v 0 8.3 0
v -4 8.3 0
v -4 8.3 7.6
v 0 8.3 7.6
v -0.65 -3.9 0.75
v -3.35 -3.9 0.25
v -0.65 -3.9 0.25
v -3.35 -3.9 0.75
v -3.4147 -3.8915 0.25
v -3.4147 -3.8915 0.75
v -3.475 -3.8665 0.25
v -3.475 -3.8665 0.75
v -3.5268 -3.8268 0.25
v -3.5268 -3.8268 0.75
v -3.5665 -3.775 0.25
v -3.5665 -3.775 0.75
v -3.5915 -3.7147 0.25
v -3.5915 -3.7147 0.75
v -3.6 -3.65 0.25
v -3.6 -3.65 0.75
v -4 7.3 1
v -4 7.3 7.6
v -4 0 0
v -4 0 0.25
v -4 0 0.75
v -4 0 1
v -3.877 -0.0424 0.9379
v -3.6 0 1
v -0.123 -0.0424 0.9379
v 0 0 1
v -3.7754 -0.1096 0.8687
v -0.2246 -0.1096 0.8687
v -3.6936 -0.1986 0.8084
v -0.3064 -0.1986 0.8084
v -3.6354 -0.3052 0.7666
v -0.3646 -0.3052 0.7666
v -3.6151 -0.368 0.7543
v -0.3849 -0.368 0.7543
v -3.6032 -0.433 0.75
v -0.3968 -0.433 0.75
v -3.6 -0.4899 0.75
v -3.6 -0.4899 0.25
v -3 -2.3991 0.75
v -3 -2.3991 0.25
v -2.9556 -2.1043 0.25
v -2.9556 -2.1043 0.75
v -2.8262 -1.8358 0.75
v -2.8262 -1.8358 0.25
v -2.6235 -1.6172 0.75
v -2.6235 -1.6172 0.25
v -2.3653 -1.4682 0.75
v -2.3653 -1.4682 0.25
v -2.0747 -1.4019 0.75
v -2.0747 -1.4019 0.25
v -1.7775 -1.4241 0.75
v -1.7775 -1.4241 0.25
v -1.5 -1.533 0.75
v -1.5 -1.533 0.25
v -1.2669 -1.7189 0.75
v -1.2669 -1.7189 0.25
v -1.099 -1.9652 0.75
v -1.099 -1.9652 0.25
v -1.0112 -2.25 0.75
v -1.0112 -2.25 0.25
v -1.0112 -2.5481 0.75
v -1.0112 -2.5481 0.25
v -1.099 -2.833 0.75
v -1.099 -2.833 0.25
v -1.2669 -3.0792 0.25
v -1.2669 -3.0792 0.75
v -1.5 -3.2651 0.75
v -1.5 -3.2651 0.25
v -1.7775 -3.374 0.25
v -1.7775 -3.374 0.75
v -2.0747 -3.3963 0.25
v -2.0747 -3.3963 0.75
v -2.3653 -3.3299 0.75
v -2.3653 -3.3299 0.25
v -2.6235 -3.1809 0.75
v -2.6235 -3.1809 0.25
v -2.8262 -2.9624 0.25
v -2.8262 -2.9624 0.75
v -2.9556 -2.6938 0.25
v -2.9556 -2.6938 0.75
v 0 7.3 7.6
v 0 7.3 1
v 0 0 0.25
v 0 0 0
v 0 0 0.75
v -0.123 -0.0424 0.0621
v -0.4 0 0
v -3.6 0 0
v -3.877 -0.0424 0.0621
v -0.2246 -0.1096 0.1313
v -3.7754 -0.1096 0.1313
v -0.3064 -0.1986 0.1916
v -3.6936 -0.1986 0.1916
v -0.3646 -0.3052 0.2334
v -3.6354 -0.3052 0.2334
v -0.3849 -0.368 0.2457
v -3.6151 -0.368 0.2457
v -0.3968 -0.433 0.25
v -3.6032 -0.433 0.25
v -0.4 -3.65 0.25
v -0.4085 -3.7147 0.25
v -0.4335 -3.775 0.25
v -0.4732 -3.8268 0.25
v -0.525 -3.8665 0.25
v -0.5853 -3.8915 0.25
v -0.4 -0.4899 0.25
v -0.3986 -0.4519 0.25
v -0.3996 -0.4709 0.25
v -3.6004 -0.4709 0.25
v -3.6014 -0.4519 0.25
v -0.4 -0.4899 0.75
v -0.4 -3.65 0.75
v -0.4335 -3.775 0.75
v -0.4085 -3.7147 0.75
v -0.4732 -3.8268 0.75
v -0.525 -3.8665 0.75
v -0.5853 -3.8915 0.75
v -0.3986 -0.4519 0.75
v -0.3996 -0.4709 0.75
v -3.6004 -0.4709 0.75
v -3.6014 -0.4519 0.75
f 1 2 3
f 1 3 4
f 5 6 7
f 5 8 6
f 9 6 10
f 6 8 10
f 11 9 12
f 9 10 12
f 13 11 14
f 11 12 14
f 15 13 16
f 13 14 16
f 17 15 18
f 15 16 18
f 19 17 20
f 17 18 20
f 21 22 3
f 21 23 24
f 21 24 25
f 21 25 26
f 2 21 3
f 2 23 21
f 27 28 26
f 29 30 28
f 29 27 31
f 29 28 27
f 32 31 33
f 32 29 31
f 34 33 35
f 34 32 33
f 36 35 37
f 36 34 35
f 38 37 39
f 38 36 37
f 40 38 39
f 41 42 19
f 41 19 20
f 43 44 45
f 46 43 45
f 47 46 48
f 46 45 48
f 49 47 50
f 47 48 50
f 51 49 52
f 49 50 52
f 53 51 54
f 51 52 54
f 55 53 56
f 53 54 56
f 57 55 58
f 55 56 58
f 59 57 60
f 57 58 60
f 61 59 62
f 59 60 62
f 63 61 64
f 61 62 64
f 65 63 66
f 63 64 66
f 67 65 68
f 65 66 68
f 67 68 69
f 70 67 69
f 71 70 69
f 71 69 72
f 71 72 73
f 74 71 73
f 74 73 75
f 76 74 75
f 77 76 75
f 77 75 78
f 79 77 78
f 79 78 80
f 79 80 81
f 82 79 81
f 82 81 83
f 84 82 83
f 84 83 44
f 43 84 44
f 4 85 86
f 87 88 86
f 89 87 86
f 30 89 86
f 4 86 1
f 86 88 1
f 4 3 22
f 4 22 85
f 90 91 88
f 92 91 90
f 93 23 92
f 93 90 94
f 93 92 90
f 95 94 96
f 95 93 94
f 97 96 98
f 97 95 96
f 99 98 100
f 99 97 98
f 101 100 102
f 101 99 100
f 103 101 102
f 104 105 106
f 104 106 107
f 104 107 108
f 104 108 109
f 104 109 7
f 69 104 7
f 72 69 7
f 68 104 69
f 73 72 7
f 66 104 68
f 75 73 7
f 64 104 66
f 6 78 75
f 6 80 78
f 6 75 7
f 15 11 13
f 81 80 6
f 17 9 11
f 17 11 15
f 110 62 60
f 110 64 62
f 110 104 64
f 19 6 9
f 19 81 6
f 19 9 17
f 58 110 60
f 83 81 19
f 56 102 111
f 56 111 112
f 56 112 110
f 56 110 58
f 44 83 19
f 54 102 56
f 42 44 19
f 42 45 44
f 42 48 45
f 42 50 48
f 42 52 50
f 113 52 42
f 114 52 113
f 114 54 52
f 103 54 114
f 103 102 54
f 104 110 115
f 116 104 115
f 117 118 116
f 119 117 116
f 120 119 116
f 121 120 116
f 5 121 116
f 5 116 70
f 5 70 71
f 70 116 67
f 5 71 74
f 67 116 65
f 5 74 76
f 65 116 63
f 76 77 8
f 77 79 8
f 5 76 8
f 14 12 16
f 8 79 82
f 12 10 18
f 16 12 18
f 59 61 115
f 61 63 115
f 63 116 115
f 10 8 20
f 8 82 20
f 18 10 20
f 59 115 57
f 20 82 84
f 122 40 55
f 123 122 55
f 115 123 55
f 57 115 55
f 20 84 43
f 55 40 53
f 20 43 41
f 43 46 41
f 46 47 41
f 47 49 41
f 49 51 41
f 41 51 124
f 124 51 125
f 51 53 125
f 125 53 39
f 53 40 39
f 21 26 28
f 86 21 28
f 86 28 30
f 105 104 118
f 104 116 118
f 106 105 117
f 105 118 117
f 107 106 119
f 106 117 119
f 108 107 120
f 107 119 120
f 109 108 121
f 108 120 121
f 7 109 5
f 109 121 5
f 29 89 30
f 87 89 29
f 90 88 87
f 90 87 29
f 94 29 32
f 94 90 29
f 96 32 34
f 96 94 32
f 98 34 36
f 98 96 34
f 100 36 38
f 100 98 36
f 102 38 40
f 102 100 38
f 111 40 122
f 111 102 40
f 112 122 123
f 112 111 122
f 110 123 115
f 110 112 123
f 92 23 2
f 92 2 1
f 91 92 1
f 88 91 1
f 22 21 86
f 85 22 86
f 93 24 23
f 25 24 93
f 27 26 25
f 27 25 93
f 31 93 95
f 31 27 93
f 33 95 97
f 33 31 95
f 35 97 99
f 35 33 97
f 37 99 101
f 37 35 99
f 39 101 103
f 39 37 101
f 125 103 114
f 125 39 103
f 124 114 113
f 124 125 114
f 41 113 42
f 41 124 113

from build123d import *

# Parameters (mm, degrees)
SZKIC1_W                    = 4
SZKIC1_H                    = 1
DODANIE_WYCI_GNI_CIE1_DEPTH = 8.3
SZKIC2_W                    = 4
SZKIC2_H                    = 1
DODANIE_WYCI_GNI_CIE2_DEPTH = 6.6
SZKIC3_W                    = 3.2
SZKIC3_H                    = 0.5
DODANIE_WYCI_GNI_CIE3_DEPTH = 3.9
ZAOKR_GLENIE1_R             = 0.5
ZAOKR_GLENIE2_R             = 0.25
SZKIC4_R                    = 1
WYTNIJ_WYCI_GNI_CIE1_DEPTH  = 3.9


with BuildPart() as part:
    # Szkic1 → Dodanie-wyciągnięcie1 (new body)
    with BuildSketch(Plane(origin=(0, 0, 0), x_dir=(1, 0, 0), z_dir=(0, 1, 0))):
        with Locations((-2, -0.5)):
            Rectangle(SZKIC1_W, SZKIC1_H)
    extrude(amount=DODANIE_WYCI_GNI_CIE1_DEPTH)

    # Szkic2 → Dodanie-wyciągnięcie2 (add)
    with BuildSketch(Plane.XY.offset(1)):
        with Locations((-2, 7.8)):
            Rectangle(SZKIC2_W, SZKIC2_H)
    extrude(amount=DODANIE_WYCI_GNI_CIE2_DEPTH)

    # Szkic3 → Dodanie-wyciągnięcie3 (add)
    with BuildSketch(Plane.XZ):
        with Locations((-2, 0.5)):
            Rectangle(SZKIC3_W, SZKIC3_H)
    extrude(amount=DODANIE_WYCI_GNI_CIE3_DEPTH)

    # Zaokrąglenie1
    # the kernel refuses this fillet: 0.5 mm, written as the material it adds along each edge
    with BuildSketch(Plane(origin=(-0.4, 0, 0.25), x_dir=(1.0, -1.5702716904537035e-12, 0), z_dir=(0, 0, 1)), Plane(origin=(-3.6, 0, 0.75), x_dir=(-1.0, -1.5702716904537041e-12, 0), z_dir=(0, 0, -1))) as zaokr_glenie1_piece_1:
        with BuildLine():
            CenterArc((0.5, -0.489897949), ZAOKR_GLENIE1_R, 101.536959033, 78.463040967)
            Line((0, -0.489897949), (-0.01, -0.489897949))
            Line((-0.01, -0.489897949), (-0.01, 0))
            Line((-0.01, 0), (0, 0.01))
            ThreePointArc((0, 0.01), (0.2, 0.01), (0.398, 0.009797959))
            Line((0.398, 0.009797959), (0.4, 0))
        make_face()
    extrude(amount=0.5)
    with BuildSketch(Plane(origin=(-0.4, 0, 0.75), x_dir=(0, 0, 1), z_dir=(-1, 0, 0)), Plane(origin=(-3.6, 0, 0.25), x_dir=(0, 0, -1), z_dir=(1, 0, 0))) as zaokr_glenie1_piece_2:
        with BuildLine():
            CenterArc((0.5, -0.433012702), ZAOKR_GLENIE1_R, 120, 60)
            Line((0, -0.433012702), (-0.01, -0.433012702))
            Line((-0.01, -0.433012702), (-0.01, 0))
            Line((-0.01, 0), (0, 0.01))
            ThreePointArc((0, 0.01), (0.125, 0.01), (0.245, 0.008660254))
            Line((0.245, 0.008660254), (0.25, 0))
        make_face()
    extrude(amount=3.2)
    with BuildSketch(Plane(origin=(-0.4, 0, -0.974744871), x_dir=(1.0, -1.5702716904537035e-12, 0), z_dir=(0, 0, 1))) as zaokr_glenie1_piece_3a_section:
        with BuildLine():
            CenterArc((0.5, -0.489897949), ZAOKR_GLENIE1_R, 101.536959033, 78.463040967)
            Line((0, -0.489897949), (-0.01, -0.489897949))
            Line((-0.01, -0.489897949), (-0.01, 0))
            Line((-0.01, 0), (0, 0.01))
            ThreePointArc((0, 0.01), (0.2, 0.01), (0.398, 0.009797959))
            Line((0.398, 0.009797959), (0.4, 0))
        make_face()
    zaokr_glenie1_piece_3a = extrude(amount=1.724744871, mode=Mode.PRIVATE)
    zaokr_glenie1_piece_3a = split(zaokr_glenie1_piece_3a, bisect_by=Plane(origin=(-0.300219951, -0.114308546, 0), z_dir=(0, 0, 1)), keep=Keep.TOP, mode=Mode.PRIVATE)
    zaokr_glenie1_piece_3a = split(zaokr_glenie1_piece_3a, bisect_by=Plane(origin=(-0.300219951, -0.114308546, 0.25), z_dir=(0, 0, -1)), keep=Keep.TOP, mode=Mode.PRIVATE)
    with BuildSketch(Plane(origin=(-3.6, 0, 0.25), x_dir=(0, 0, -1), z_dir=(1, 0, 0))) as zaokr_glenie1_piece_3b_section:
        with BuildLine():
            CenterArc((0.5, -0.433012702), ZAOKR_GLENIE1_R, 120, 60)
            Line((0, -0.433012702), (-0.01, -0.433012702))
            Line((-0.01, -0.433012702), (-0.01, 0))
            Line((-0.01, 0), (0, 0.01))
            ThreePointArc((0, 0.01), (0.125, 0.01), (0.245, 0.008660254))
            Line((0.245, 0.008660254), (0.25, 0))
        make_face()
    zaokr_glenie1_piece_3b = extrude(amount=4.282531755, mode=Mode.PRIVATE)
    zaokr_glenie1_piece_3b = split(zaokr_glenie1_piece_3b, bisect_by=Plane(origin=(0, -0.108155223, 0.185241644), z_dir=(-1, 0, 0)), keep=Keep.TOP, mode=Mode.PRIVATE)
    zaokr_glenie1_piece_3b = split(zaokr_glenie1_piece_3b, bisect_by=Plane(origin=(-0.4, -0.108155223, 0.185241644), z_dir=(1, 0, 0)), keep=Keep.TOP, mode=Mode.PRIVATE)
    zaokr_glenie1_piece_3 = zaokr_glenie1_piece_3a & zaokr_glenie1_piece_3b
    add(zaokr_glenie1_piece_3)
    with BuildSketch(Plane(origin=(0.682531755, 0, 0.75), x_dir=(0, 0, 1), z_dir=(-1, 0, 0))) as zaokr_glenie1_piece_4a_section:
        with BuildLine():
            CenterArc((0.5, -0.433012702), ZAOKR_GLENIE1_R, 120, 60)
            Line((0, -0.433012702), (-0.01, -0.433012702))
            Line((-0.01, -0.433012702), (-0.01, 0))
            Line((-0.01, 0), (0, 0.01))
            ThreePointArc((0, 0.01), (0.125, 0.01), (0.245, 0.008660254))
            Line((0.245, 0.008660254), (0.25, 0))
        make_face()
    zaokr_glenie1_piece_4a = extrude(amount=4.282531755, mode=Mode.PRIVATE)
    zaokr_glenie1_piece_4a = split(zaokr_glenie1_piece_4a, bisect_by=Plane(origin=(0, -0.108155223, 0.814758356), z_dir=(-1, 0, 0)), keep=Keep.TOP, mode=Mode.PRIVATE)
    zaokr_glenie1_piece_4a = split(zaokr_glenie1_piece_4a, bisect_by=Plane(origin=(-0.4, -0.108155223, 0.814758356), z_dir=(1, 0, 0)), keep=Keep.TOP, mode=Mode.PRIVATE)
    with BuildSketch(Plane(origin=(-0.4, 0, 0.25), x_dir=(1.0, -1.5702716904537035e-12, 0), z_dir=(0, 0, 1))) as zaokr_glenie1_piece_4b_section:
        with BuildLine():
            CenterArc((0.5, -0.489897949), ZAOKR_GLENIE1_R, 101.536959033, 78.463040967)
            Line((0, -0.489897949), (-0.01, -0.489897949))
            Line((-0.01, -0.489897949), (-0.01, 0))
            Line((-0.01, 0), (0, 0.01))
            ThreePointArc((0, 0.01), (0.2, 0.01), (0.398, 0.009797959))
            Line((0.398, 0.009797959), (0.4, 0))
        make_face()
    zaokr_glenie1_piece_4b = extrude(amount=1.724744871, mode=Mode.PRIVATE)
    zaokr_glenie1_piece_4b = split(zaokr_glenie1_piece_4b, bisect_by=Plane(origin=(-0.300219951, -0.114308546, 1), z_dir=(0, 0, -1)), keep=Keep.TOP, mode=Mode.PRIVATE)
    zaokr_glenie1_piece_4b = split(zaokr_glenie1_piece_4b, bisect_by=Plane(origin=(-0.300219951, -0.114308546, 0.75), z_dir=(0, 0, 1)), keep=Keep.TOP, mode=Mode.PRIVATE)
    zaokr_glenie1_piece_4 = zaokr_glenie1_piece_4a & zaokr_glenie1_piece_4b
    add(zaokr_glenie1_piece_4)
    with BuildSketch(Plane(origin=(-3.6, 0, 1.974744871), x_dir=(-1.0, -1.5702716904537041e-12, 0), z_dir=(0, 0, -1))) as zaokr_glenie1_piece_5a_section:
        with BuildLine():
            CenterArc((0.5, -0.489897949), ZAOKR_GLENIE1_R, 101.536959033, 78.463040967)
            Line((0, -0.489897949), (-0.01, -0.489897949))
            Line((-0.01, -0.489897949), (-0.01, 0))
            Line((-0.01, 0), (0, 0.01))
            ThreePointArc((0, 0.01), (0.2, 0.01), (0.398, 0.009797959))
            Line((0.398, 0.009797959), (0.4, 0))
        make_face()
    zaokr_glenie1_piece_5a = extrude(amount=1.724744871, mode=Mode.PRIVATE)
    zaokr_glenie1_piece_5a = split(zaokr_glenie1_piece_5a, bisect_by=Plane(origin=(-3.699780049, -0.114308546, 1), z_dir=(0, 0, -1)), keep=Keep.TOP, mode=Mode.PRIVATE)
    zaokr_glenie1_piece_5a = split(zaokr_glenie1_piece_5a, bisect_by=Plane(origin=(-3.699780049, -0.114308546, 0.75), z_dir=(0, 0, 1)), keep=Keep.TOP, mode=Mode.PRIVATE)
    with BuildSketch(Plane(origin=(-0.4, 0, 0.75), x_dir=(0, 0, 1), z_dir=(-1, 0, 0))) as zaokr_glenie1_piece_5b_section:
        with BuildLine():
            CenterArc((0.5, -0.433012702), ZAOKR_GLENIE1_R, 120, 60)
            Line((0, -0.433012702), (-0.01, -0.433012702))
            Line((-0.01, -0.433012702), (-0.01, 0))
            Line((-0.01, 0), (0, 0.01))
            ThreePointArc((0, 0.01), (0.125, 0.01), (0.245, 0.008660254))
            Line((0.245, 0.008660254), (0.25, 0))
        make_face()
    zaokr_glenie1_piece_5b = extrude(amount=4.282531755, mode=Mode.PRIVATE)
    zaokr_glenie1_piece_5b = split(zaokr_glenie1_piece_5b, bisect_by=Plane(origin=(-4, -0.108155223, 0.814758356), z_dir=(1, 0, 0)), keep=Keep.TOP, mode=Mode.PRIVATE)
    zaokr_glenie1_piece_5b = split(zaokr_glenie1_piece_5b, bisect_by=Plane(origin=(-3.6, -0.108155223, 0.814758356), z_dir=(-1, 0, 0)), keep=Keep.TOP, mode=Mode.PRIVATE)
    zaokr_glenie1_piece_5 = zaokr_glenie1_piece_5a & zaokr_glenie1_piece_5b
    add(zaokr_glenie1_piece_5)
    with BuildSketch(Plane(origin=(-3.6, 0, 0.75), x_dir=(-1.0, -1.5702716904537041e-12, 0), z_dir=(0, 0, -1))) as zaokr_glenie1_piece_6a_section:
        with BuildLine():
            CenterArc((0.5, -0.489897949), ZAOKR_GLENIE1_R, 101.536959033, 78.463040967)
            Line((0, -0.489897949), (-0.01, -0.489897949))
            Line((-0.01, -0.489897949), (-0.01, 0))
            Line((-0.01, 0), (0, 0.01))
            ThreePointArc((0, 0.01), (0.2, 0.01), (0.398, 0.009797959))
            Line((0.398, 0.009797959), (0.4, 0))
        make_face()
    zaokr_glenie1_piece_6a = extrude(amount=1.724744871, mode=Mode.PRIVATE)
    zaokr_glenie1_piece_6a = split(zaokr_glenie1_piece_6a, bisect_by=Plane(origin=(-3.699780049, -0.114308546, 0), z_dir=(0, 0, 1)), keep=Keep.TOP, mode=Mode.PRIVATE)
    zaokr_glenie1_piece_6a = split(zaokr_glenie1_piece_6a, bisect_by=Plane(origin=(-3.699780049, -0.114308546, 0.25), z_dir=(0, 0, -1)), keep=Keep.TOP, mode=Mode.PRIVATE)
    with BuildSketch(Plane(origin=(-4.682531755, 0, 0.25), x_dir=(0, 0, -1), z_dir=(1, 0, 0))) as zaokr_glenie1_piece_6b_section:
        with BuildLine():
            CenterArc((0.5, -0.433012702), ZAOKR_GLENIE1_R, 120, 60)
            Line((0, -0.433012702), (-0.01, -0.433012702))
            Line((-0.01, -0.433012702), (-0.01, 0))
            Line((-0.01, 0), (0, 0.01))
            ThreePointArc((0, 0.01), (0.125, 0.01), (0.245, 0.008660254))
            Line((0.245, 0.008660254), (0.25, 0))
        make_face()
    zaokr_glenie1_piece_6b = extrude(amount=4.282531755, mode=Mode.PRIVATE)
    zaokr_glenie1_piece_6b = split(zaokr_glenie1_piece_6b, bisect_by=Plane(origin=(-4, -0.108155223, 0.185241644), z_dir=(1, 0, 0)), keep=Keep.TOP, mode=Mode.PRIVATE)
    zaokr_glenie1_piece_6b = split(zaokr_glenie1_piece_6b, bisect_by=Plane(origin=(-3.6, -0.108155223, 0.185241644), z_dir=(-1, 0, 0)), keep=Keep.TOP, mode=Mode.PRIVATE)
    zaokr_glenie1_piece_6 = zaokr_glenie1_piece_6a & zaokr_glenie1_piece_6b
    add(zaokr_glenie1_piece_6)

    # Zaokrąglenie2
    zaokr_glenie2_edges = [part.edges().sort_by_distance(p)[0] for p in [
        (-0.4, -3.9, 0.5),
        (-3.6, -3.9, 0.5),
    ]]
    fillet(zaokr_glenie2_edges, radius=ZAOKR_GLENIE2_R)

    # Szkic4 → Wytnij-wyciągnięcie1 (cut)
    with BuildSketch(Plane(origin=(0, 0, 0.25), x_dir=(-1, 0, 0), z_dir=(0, 0, -1))):
        with Locations((2, -2.399073148)):
            Circle(SZKIC4_R)
    extrude(amount=-WYTNIJ_WYCI_GNI_CIE1_DEPTH, mode=Mode.SUBTRACT)


solid = part.part
